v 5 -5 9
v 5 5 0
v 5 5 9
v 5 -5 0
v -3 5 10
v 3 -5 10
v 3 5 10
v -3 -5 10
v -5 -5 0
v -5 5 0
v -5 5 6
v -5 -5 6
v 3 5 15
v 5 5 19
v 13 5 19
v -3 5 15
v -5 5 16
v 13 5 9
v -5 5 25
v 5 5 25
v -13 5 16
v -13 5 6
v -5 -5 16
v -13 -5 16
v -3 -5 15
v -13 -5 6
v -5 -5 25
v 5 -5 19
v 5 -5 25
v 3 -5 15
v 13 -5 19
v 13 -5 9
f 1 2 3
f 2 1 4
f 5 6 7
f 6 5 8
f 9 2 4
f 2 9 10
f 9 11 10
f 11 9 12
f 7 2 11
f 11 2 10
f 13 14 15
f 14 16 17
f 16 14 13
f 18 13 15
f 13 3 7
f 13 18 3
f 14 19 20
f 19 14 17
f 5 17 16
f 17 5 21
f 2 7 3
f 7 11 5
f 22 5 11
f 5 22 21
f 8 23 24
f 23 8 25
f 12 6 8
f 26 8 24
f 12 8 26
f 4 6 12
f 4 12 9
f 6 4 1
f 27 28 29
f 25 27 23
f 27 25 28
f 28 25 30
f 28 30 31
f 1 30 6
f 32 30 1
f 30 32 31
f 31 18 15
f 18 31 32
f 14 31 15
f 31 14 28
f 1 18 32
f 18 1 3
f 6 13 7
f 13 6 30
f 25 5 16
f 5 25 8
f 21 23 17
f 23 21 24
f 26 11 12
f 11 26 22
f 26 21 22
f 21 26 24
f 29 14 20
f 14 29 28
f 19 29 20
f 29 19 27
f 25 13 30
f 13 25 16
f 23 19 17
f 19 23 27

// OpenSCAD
/*intersection() {    
    difference() {
        translate([0, 0, 0])
            sphere(r=8.5);
        translate([0, 5, 0])
            sphere(r=8.5);
        translate([0, -5, 0])
            sphere(r=8.5);
    }
}*/

/*intersection() {    
    difference() {
        translate([0, 0, 0])
            sphere(r=8.5);
        translate([0, 5, 5])
            sphere(r=8.5);
        translate([0, -5, 0])
            sphere(r=8.5);
    }
}*/

/*
difference() {
    
rotate([0, 20, 0]) {
    difference() {
        translate([0, 0, 0])
            sphere(r=8.5);
        translate([0, 0, 8])
            sphere(r=8.5);
        translate([0, 0, -8])
            sphere(r=8.5);
       translate([15, 0, 3])
            sphere(r=8.5);
        translate([0, 15, 3])
            sphere(r=8.5);
        
    }

}
    translate([-15, -15, -1.4])
            cube([30, 30, 20]);
}
*/

union() {   
translate([-5, -5, 0])
    cube([10, 10, 10]);
translate([3, -5, 9])
    cube([10, 10, 10]);
translate([-13, -5, 6])
    cube([10, 10, 10]);
translate([-5, -5, 15])
    cube([10, 10, 10]);
}
